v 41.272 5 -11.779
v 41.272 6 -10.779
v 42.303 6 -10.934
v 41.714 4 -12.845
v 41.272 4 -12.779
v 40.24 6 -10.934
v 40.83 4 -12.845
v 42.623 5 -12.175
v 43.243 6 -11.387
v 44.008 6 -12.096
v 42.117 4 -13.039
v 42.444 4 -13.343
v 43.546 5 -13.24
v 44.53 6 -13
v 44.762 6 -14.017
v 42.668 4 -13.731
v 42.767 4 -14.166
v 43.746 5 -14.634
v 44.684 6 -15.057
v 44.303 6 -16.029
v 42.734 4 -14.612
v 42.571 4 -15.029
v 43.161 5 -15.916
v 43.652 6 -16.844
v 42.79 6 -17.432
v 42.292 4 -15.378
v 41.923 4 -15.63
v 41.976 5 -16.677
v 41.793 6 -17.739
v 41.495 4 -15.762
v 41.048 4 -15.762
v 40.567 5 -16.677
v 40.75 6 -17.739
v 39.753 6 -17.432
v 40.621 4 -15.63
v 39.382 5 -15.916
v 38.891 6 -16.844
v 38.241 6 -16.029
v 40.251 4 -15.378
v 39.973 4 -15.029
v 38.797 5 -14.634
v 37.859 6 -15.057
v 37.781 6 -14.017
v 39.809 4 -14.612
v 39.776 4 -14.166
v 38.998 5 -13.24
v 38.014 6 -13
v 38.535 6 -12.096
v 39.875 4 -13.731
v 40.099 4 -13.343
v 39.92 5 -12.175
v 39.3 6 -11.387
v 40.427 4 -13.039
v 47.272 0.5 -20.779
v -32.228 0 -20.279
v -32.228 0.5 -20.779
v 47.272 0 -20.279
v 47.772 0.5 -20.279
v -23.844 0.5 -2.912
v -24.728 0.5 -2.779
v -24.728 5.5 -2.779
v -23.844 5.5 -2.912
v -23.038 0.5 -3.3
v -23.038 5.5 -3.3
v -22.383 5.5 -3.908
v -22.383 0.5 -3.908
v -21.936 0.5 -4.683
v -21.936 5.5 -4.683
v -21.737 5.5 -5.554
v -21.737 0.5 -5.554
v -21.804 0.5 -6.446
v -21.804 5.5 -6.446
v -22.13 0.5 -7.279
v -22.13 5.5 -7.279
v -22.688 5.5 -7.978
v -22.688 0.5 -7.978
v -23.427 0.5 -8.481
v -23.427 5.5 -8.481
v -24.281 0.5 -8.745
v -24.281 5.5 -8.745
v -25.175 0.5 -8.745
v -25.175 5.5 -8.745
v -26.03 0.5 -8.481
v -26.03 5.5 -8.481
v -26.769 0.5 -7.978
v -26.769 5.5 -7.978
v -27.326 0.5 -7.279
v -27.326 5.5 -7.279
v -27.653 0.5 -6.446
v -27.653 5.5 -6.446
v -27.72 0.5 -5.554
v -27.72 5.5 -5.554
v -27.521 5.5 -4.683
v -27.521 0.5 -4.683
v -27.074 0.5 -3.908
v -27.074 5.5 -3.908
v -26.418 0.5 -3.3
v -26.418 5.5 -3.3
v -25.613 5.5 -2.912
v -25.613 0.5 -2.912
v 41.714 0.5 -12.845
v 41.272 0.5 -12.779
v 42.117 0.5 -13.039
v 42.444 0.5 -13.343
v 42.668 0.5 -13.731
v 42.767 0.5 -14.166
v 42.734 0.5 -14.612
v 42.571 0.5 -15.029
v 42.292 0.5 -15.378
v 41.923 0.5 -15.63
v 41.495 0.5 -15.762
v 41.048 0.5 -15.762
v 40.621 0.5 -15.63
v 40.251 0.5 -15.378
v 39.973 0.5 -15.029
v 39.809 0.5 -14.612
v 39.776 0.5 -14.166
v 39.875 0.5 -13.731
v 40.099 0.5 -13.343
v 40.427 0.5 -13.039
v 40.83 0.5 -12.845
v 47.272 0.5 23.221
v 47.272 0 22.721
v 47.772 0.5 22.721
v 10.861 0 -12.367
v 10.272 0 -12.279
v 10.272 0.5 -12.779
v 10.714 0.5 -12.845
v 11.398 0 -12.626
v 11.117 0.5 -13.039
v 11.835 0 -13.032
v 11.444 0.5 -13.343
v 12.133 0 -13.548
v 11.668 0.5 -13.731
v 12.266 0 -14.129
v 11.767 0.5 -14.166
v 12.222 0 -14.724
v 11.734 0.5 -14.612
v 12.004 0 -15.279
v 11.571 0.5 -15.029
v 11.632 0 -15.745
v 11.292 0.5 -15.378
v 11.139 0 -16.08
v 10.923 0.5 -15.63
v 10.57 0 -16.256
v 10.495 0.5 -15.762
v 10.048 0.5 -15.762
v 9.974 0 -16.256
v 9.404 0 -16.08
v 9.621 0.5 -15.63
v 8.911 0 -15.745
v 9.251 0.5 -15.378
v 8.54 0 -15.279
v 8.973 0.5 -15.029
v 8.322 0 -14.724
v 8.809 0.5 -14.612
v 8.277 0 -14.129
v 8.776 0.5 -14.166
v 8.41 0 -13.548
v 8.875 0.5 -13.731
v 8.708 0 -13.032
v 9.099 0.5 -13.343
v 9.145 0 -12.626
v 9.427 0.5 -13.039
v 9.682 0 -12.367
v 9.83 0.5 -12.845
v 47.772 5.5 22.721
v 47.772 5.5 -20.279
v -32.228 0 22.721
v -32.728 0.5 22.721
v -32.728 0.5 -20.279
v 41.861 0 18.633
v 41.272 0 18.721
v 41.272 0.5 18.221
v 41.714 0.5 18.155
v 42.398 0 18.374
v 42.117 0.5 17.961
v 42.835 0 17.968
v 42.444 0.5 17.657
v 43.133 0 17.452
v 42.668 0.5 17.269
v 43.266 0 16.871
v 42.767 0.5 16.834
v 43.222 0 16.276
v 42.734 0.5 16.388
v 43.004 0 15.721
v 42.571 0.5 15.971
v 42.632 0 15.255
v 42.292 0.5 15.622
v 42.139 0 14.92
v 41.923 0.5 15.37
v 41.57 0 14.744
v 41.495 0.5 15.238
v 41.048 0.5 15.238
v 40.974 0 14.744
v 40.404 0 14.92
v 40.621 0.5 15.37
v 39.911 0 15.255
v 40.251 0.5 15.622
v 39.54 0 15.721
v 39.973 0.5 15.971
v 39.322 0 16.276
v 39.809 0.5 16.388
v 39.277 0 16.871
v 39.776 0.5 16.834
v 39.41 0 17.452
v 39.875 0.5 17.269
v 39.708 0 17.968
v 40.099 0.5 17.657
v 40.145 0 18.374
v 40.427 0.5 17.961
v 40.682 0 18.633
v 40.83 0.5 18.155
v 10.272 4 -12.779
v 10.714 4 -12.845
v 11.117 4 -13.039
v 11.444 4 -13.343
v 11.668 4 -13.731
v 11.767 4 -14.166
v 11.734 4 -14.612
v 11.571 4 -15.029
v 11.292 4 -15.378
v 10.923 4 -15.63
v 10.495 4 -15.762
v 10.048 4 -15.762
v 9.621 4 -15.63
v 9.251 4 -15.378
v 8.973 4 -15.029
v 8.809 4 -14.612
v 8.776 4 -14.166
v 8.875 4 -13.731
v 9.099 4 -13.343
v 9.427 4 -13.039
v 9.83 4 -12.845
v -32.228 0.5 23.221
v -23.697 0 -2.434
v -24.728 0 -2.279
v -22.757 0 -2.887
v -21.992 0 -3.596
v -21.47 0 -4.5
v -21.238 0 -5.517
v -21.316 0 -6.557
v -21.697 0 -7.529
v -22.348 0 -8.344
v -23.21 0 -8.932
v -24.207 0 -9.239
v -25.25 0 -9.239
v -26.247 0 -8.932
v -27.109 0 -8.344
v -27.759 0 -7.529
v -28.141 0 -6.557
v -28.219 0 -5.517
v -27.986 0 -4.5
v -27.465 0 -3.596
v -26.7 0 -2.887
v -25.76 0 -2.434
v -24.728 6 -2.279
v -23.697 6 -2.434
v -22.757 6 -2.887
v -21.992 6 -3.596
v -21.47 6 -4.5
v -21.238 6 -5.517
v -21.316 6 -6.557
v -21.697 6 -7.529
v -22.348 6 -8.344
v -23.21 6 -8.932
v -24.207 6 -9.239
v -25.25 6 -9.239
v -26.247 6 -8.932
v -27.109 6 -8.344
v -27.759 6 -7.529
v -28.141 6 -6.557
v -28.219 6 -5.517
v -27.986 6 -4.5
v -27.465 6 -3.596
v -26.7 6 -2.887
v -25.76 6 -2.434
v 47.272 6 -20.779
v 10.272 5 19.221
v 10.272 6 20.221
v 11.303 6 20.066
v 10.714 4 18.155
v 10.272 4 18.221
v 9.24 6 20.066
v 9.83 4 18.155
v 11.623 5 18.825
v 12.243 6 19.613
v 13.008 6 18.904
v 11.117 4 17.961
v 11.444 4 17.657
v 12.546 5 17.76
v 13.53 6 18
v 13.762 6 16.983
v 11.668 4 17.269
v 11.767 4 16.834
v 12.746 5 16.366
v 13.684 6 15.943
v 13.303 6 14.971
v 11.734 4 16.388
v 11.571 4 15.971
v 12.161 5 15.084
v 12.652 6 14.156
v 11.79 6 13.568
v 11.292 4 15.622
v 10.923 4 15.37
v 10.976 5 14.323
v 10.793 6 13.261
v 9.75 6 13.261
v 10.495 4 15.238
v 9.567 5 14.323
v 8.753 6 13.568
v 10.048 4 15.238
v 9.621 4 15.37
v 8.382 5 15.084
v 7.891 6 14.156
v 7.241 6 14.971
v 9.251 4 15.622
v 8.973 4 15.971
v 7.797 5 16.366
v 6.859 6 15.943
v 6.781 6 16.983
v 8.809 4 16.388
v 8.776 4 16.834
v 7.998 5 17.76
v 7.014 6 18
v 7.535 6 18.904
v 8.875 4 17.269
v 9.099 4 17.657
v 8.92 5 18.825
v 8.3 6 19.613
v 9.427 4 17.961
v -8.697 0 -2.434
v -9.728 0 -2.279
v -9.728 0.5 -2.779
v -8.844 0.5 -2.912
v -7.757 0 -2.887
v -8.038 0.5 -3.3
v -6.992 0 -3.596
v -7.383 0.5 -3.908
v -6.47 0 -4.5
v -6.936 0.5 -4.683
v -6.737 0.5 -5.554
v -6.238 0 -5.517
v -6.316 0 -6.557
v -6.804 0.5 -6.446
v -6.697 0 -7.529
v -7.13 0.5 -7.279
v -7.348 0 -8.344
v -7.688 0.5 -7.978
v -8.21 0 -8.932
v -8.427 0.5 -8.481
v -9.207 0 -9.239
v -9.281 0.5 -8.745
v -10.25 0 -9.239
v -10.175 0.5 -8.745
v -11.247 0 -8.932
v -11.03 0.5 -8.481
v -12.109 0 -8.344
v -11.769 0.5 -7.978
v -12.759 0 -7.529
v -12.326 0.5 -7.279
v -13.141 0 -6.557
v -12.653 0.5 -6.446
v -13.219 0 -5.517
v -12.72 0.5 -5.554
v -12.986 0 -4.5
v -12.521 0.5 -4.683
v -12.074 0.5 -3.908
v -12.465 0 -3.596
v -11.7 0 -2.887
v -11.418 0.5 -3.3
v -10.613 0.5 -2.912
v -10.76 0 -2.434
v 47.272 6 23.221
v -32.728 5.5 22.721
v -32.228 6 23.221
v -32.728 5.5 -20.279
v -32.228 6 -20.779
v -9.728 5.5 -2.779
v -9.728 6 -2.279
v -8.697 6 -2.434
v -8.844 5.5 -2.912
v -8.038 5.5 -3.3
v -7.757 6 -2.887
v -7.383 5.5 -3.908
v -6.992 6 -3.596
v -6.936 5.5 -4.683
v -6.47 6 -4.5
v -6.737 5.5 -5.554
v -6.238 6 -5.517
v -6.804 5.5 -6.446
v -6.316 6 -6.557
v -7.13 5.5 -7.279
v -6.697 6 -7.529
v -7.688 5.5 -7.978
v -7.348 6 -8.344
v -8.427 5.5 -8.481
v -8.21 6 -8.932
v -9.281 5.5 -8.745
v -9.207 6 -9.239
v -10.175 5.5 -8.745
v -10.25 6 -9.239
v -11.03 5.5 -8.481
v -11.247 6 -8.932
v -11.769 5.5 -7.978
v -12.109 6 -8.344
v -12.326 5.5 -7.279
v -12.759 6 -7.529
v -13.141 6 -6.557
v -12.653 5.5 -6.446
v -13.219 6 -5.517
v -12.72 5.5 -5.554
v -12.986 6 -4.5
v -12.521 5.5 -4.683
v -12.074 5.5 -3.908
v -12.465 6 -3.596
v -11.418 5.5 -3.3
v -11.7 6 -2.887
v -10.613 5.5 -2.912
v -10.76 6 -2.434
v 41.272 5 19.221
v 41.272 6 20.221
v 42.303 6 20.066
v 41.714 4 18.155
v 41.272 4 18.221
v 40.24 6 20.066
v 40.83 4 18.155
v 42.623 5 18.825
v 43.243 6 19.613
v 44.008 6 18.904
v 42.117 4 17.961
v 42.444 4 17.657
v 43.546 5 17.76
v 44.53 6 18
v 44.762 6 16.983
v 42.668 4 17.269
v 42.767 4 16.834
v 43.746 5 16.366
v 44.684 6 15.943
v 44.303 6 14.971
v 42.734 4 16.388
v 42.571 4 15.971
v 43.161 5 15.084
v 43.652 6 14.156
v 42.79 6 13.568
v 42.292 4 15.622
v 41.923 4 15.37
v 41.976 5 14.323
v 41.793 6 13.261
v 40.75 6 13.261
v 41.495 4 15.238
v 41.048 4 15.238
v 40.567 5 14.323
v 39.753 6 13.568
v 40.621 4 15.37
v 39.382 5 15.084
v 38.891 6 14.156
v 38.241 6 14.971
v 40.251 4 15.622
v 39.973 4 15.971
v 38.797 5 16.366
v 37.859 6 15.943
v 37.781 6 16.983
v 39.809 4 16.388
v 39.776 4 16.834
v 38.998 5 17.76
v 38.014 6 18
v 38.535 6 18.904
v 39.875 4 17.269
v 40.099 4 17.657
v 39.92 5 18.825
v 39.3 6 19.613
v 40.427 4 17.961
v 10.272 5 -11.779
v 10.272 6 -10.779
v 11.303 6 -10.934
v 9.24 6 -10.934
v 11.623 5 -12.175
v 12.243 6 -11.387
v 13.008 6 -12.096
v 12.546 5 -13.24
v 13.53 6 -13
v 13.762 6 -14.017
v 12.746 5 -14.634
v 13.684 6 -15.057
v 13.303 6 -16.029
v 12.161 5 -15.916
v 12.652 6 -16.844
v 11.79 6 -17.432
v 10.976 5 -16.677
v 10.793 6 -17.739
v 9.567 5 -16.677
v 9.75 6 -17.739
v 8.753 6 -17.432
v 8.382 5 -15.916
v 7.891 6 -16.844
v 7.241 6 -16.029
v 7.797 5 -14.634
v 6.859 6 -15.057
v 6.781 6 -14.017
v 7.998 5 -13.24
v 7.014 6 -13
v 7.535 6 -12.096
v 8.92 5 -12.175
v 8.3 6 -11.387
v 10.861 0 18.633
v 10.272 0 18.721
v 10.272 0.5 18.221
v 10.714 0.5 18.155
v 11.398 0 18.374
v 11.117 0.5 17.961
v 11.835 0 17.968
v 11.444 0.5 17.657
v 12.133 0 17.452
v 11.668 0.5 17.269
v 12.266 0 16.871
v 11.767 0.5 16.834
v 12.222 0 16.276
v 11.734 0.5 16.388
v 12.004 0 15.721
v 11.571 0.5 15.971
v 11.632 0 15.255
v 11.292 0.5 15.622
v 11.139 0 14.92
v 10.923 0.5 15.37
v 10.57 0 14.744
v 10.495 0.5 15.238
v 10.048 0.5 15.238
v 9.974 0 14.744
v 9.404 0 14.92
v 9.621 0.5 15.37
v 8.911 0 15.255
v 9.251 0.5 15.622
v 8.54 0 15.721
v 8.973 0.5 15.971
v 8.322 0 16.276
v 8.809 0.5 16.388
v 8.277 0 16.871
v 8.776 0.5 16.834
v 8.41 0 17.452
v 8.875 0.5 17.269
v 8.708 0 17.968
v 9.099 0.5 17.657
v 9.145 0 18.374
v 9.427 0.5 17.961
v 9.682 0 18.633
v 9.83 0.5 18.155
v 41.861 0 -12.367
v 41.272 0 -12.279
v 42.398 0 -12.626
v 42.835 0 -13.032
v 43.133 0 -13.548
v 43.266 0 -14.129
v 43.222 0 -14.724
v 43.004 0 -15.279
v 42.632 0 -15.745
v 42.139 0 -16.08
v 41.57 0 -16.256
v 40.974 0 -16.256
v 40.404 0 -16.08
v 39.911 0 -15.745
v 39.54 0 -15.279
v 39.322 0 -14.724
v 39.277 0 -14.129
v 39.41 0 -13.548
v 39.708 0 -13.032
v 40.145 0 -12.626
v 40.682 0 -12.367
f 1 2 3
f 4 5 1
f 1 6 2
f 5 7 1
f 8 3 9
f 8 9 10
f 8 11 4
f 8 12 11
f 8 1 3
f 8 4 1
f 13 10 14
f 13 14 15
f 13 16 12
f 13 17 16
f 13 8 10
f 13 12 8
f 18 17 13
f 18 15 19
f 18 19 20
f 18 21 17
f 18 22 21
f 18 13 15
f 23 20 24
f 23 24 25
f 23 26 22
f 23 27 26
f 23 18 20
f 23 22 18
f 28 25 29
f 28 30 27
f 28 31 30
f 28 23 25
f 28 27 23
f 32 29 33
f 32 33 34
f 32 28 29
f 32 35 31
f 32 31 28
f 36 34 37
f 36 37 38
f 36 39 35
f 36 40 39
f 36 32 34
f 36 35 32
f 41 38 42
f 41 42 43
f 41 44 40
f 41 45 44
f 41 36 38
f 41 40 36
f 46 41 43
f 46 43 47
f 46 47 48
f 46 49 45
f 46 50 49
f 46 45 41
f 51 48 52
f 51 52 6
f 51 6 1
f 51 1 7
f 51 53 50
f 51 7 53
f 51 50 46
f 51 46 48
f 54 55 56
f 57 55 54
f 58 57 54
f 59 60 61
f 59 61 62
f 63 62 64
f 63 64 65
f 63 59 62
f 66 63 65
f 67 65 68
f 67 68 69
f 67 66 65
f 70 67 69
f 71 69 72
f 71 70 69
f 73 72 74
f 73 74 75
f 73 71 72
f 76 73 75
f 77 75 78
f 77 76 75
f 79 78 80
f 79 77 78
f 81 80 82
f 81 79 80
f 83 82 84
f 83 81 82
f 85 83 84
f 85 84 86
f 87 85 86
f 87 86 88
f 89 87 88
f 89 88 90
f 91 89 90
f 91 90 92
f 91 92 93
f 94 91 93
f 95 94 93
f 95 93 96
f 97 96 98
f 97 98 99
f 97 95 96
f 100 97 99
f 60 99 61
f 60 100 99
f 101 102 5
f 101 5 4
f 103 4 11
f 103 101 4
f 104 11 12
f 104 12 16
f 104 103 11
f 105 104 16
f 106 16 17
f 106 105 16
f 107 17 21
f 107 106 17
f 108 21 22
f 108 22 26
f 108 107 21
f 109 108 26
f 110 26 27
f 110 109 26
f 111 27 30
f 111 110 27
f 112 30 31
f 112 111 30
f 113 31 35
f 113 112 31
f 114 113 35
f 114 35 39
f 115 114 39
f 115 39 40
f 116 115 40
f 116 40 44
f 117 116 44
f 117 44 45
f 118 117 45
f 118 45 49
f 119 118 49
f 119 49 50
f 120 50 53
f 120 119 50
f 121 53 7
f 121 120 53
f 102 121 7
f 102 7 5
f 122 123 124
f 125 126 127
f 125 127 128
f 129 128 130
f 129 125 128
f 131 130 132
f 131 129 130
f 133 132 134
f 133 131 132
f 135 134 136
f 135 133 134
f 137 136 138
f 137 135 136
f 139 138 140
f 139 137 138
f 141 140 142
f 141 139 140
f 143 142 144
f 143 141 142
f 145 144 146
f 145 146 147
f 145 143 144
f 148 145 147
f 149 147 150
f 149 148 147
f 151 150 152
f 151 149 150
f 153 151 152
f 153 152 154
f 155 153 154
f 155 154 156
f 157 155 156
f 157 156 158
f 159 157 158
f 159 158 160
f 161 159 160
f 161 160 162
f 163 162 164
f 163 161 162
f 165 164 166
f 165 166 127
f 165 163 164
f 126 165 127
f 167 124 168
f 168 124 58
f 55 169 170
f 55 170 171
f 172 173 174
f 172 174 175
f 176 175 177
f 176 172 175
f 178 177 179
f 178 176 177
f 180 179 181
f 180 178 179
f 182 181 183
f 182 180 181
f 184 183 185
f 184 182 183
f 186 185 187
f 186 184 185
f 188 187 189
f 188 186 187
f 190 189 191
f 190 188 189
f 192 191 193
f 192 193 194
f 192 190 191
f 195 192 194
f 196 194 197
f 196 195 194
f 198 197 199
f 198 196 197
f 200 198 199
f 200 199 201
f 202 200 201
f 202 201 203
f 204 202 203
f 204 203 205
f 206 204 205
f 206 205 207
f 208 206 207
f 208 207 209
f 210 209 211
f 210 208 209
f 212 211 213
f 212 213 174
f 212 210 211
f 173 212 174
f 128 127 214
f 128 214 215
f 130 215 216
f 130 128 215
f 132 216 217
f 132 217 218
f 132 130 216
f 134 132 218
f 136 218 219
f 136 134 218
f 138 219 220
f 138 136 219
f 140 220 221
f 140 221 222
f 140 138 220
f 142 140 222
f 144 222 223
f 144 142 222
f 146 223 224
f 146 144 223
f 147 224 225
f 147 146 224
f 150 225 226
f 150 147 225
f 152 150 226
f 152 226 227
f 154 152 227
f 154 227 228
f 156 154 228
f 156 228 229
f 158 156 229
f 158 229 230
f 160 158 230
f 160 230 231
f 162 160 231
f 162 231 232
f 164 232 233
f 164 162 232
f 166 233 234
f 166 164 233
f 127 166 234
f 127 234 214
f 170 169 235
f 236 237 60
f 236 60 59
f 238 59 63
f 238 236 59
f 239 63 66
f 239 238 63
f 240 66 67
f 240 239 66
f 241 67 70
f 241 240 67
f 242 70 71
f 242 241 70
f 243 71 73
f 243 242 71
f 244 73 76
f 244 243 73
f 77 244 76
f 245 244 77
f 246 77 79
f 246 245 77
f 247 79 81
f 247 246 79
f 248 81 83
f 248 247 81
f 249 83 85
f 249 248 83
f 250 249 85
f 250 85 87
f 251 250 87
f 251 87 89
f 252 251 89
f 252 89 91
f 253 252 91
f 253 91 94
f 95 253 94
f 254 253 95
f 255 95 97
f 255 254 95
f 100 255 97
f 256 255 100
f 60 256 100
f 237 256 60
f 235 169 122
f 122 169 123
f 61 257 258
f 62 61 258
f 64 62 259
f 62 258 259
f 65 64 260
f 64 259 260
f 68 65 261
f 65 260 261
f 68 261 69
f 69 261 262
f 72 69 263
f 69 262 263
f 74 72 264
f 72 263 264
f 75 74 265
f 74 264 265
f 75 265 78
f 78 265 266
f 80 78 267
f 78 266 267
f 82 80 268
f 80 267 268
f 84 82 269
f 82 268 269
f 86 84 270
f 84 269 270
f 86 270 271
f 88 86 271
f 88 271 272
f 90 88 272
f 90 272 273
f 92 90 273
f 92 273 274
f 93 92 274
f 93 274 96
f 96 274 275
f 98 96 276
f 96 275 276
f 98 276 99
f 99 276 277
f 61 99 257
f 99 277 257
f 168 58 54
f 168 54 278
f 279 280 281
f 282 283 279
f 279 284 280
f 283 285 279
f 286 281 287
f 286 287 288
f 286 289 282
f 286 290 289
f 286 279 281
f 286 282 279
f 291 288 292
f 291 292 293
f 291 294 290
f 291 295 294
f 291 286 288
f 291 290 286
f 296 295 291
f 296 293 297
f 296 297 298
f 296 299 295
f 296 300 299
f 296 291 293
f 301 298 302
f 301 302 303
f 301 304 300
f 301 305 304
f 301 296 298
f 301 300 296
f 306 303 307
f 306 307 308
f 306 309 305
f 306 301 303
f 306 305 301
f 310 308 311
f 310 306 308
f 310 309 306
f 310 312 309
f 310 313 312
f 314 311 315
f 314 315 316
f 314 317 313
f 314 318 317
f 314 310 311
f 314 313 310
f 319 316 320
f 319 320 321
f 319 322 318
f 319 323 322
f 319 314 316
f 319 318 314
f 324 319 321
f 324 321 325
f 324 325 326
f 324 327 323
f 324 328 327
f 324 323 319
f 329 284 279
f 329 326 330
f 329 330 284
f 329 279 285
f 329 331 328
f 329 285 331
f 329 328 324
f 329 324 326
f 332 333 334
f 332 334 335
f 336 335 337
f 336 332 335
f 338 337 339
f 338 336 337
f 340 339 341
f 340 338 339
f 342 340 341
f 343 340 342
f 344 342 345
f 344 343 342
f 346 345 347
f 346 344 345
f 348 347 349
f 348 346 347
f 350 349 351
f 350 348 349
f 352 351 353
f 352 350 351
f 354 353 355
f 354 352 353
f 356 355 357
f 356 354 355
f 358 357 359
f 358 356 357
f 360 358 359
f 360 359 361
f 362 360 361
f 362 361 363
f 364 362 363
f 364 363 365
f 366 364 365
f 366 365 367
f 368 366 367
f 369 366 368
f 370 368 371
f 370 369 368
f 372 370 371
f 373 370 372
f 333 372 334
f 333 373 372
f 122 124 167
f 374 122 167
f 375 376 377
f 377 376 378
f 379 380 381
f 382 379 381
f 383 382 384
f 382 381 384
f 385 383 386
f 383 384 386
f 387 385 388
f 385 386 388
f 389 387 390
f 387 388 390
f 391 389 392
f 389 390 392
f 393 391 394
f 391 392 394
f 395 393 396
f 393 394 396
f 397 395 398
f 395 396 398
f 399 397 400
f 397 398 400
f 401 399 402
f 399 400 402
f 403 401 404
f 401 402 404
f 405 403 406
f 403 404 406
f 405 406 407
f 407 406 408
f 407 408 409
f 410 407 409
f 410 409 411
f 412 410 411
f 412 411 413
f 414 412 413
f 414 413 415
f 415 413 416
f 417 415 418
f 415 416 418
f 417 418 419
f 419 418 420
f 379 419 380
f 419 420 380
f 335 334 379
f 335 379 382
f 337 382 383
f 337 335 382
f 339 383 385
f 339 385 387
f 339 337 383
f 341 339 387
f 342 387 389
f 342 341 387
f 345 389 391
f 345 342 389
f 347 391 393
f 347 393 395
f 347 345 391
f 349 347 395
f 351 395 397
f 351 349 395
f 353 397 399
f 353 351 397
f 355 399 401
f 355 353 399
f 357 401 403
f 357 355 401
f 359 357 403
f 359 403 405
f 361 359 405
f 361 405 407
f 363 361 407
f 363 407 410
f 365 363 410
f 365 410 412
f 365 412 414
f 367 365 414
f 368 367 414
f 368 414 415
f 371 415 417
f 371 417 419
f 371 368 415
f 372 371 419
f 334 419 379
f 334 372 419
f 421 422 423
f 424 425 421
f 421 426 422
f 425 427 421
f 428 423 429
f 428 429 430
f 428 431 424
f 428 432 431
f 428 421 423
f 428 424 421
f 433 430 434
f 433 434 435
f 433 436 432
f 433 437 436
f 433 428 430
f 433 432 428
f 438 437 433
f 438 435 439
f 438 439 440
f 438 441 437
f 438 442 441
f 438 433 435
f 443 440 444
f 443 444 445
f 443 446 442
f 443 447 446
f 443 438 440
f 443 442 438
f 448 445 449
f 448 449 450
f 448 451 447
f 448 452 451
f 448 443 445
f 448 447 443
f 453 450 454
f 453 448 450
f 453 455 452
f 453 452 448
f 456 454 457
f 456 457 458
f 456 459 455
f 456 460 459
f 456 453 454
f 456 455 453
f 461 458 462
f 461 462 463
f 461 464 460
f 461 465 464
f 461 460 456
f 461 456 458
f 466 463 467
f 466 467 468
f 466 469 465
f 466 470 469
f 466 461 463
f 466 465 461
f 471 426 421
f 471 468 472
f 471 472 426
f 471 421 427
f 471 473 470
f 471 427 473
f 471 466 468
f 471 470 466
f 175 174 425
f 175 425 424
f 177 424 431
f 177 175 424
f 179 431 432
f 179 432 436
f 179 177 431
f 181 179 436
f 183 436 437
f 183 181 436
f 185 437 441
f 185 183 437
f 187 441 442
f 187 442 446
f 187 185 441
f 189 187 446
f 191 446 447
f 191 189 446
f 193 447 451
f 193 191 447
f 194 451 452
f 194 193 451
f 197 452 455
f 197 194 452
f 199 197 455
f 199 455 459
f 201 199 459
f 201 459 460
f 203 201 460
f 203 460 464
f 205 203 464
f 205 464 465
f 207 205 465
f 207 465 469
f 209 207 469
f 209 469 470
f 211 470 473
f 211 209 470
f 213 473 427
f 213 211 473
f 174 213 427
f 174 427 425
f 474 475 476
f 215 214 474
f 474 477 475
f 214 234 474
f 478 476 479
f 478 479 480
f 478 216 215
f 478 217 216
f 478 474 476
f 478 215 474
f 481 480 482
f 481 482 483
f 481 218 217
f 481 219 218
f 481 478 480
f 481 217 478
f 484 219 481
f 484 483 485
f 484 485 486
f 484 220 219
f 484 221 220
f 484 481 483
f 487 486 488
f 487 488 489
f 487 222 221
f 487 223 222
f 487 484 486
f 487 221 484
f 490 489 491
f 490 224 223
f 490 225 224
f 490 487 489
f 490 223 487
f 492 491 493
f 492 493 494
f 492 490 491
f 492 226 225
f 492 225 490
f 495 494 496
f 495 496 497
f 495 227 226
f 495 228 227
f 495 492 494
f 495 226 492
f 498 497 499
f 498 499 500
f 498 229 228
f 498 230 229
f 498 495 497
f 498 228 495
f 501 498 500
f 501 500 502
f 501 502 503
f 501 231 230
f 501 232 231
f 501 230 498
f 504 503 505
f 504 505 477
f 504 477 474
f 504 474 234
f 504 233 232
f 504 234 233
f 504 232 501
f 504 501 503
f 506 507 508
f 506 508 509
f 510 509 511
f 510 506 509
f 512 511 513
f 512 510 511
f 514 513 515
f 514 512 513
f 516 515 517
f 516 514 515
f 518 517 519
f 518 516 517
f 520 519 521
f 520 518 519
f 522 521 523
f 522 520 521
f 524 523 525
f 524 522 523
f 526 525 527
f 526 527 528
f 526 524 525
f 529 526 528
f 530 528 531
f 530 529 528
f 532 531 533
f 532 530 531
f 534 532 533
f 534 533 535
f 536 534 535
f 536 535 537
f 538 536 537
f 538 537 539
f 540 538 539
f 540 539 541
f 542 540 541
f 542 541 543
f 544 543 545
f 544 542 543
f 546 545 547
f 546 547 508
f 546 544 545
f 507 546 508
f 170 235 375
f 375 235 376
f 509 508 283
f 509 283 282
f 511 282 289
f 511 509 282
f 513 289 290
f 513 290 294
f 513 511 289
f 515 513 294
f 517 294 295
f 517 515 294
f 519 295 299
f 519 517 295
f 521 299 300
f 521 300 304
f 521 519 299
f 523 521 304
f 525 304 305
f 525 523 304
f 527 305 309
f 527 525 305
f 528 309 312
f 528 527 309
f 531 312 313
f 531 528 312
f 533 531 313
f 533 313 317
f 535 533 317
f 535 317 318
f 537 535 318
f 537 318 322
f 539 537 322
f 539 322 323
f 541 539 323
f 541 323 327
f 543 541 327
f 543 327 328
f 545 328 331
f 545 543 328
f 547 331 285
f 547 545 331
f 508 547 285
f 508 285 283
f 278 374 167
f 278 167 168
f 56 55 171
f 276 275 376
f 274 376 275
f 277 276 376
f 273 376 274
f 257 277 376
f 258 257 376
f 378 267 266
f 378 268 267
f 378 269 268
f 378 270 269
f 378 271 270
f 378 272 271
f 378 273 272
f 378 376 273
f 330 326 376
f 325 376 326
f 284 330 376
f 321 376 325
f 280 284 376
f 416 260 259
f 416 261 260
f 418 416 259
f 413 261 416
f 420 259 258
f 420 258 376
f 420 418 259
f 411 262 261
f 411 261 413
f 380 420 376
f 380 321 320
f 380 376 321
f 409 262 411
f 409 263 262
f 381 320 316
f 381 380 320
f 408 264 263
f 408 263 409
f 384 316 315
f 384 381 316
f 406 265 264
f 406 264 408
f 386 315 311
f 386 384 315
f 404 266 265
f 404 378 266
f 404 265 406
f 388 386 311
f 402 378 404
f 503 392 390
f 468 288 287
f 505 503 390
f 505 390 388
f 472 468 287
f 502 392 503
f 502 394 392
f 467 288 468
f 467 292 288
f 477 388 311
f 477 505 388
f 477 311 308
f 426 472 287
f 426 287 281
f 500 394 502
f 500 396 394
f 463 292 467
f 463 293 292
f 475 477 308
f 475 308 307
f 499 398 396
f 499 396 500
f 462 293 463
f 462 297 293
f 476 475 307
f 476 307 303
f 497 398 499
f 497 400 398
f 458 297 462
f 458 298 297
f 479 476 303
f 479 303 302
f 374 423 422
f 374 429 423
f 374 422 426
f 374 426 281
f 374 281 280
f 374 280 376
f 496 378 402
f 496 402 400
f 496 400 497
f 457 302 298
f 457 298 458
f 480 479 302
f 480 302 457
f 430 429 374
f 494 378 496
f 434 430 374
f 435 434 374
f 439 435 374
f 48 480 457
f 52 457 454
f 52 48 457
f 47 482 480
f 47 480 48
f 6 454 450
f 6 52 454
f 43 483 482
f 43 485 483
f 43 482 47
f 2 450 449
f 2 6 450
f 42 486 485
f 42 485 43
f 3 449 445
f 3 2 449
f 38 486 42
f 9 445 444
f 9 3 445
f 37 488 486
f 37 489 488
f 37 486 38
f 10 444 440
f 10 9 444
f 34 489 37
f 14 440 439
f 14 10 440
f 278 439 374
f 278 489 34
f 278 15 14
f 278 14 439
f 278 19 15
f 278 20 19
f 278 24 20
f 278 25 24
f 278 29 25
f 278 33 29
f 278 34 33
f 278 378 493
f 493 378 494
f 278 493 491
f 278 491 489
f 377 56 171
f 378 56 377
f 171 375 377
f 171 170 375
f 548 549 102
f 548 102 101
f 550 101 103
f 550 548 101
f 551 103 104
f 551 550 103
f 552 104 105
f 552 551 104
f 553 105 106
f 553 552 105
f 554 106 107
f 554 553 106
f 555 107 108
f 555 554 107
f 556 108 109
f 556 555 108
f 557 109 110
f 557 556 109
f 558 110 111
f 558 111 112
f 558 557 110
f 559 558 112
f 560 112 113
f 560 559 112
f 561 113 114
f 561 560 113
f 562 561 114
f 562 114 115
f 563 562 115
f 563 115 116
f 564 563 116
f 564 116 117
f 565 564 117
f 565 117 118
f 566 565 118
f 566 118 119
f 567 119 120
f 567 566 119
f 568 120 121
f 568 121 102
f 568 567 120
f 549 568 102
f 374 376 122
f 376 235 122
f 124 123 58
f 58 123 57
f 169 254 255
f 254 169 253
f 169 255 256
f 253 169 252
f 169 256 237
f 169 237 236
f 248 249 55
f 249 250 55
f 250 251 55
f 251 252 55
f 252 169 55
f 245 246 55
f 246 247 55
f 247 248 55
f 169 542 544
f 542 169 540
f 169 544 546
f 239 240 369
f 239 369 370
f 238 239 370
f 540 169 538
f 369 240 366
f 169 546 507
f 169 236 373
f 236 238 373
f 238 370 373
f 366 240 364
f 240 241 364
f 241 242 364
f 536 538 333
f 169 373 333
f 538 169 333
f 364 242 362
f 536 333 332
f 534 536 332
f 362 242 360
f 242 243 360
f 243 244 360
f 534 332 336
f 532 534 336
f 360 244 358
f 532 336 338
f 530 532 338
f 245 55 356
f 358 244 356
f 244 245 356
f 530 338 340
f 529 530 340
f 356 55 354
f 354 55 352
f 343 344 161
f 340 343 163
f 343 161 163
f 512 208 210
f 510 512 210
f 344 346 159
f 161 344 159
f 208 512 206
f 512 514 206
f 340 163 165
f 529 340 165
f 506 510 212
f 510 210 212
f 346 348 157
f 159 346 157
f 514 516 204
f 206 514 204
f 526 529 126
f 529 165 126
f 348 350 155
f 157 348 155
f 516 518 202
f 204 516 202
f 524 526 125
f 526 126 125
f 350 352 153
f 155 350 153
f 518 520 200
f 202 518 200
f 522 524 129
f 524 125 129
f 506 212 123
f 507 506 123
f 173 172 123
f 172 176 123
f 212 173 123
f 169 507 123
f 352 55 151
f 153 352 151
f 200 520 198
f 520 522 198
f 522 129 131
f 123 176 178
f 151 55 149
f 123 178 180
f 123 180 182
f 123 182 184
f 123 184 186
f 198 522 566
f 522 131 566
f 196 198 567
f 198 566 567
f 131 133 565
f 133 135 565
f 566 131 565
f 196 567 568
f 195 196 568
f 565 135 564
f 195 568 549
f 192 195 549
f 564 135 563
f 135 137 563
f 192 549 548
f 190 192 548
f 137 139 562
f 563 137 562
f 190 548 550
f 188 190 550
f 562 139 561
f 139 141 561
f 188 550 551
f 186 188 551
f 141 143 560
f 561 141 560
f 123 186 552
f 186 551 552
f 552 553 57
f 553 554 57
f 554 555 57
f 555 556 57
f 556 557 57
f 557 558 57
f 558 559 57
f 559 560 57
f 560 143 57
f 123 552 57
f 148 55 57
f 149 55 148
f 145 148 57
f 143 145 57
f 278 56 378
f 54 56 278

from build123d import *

# Parameters (mm, degrees)
CROQUIS1_W              = 80.5
CROQUIS1_H              = 44
CROQUIS1_R              = 1.5
CROQUIS1_R_2            = 3
SALIENTE_EXTRUIR1_DEPTH = 6
CHAFL_N1_SIZE           = 0.5
CHAFL_N2_SIZE           = 2


with BuildPart() as part:
    # Croquis1 → Saliente-Extruir1 (new body)
    with BuildSketch(Plane(origin=(0, 0, 0), x_dir=(1, 0, 0), z_dir=(0, 1, 0))):
        with Locations((7.521686308, -1.221461187)):
            Rectangle(CROQUIS1_W, CROQUIS1_H)
        with Locations(Location((10.271686308, 14.278538813, 0), (0, 0, 270))):
            Circle(CROQUIS1_R, mode=Mode.SUBTRACT)
        with Locations(Location((41.271686308, 14.278538813, 0), (0, 0, 270))):
            Circle(CROQUIS1_R, mode=Mode.SUBTRACT)
        with Locations(Location((10.271686308, -16.721461187, 0), (0, 0, 270))):
            Circle(CROQUIS1_R, mode=Mode.SUBTRACT)
        with Locations(Location((41.271686308, -16.721461187, 0), (0, 0, 270))):
            Circle(CROQUIS1_R, mode=Mode.SUBTRACT)
        with Locations(Location((-24.728313692, 5.778538813, 0), (0, 0, 270))):
            Circle(CROQUIS1_R_2, mode=Mode.SUBTRACT)
        with Locations(Location((-9.728313692, 5.778538813, 0), (0, 0, 270))):
            Circle(CROQUIS1_R_2, mode=Mode.SUBTRACT)
    extrude(amount=SALIENTE_EXTRUIR1_DEPTH)

    # Chaflán1
    chafl_n1_edges = [part.edges().sort_by_distance(p)[0] for p in [
        (47.771686308, 6, 1.221461187),
        (10.271686308, 0, -15.778538813),
        (41.271686308, 0, -15.778538813),
        (10.271686308, 0, 15.221461187),
        (41.271686308, 0, 15.221461187),
        (-24.728313692, 0, -8.778538813),
        (-24.728313692, 6, -8.778538813),
        (-9.728313692, 0, -8.778538813),
        (-9.728313692, 6, -8.778538813),
        (-32.728313692, 6, 1.221461187),
        (7.521686308, 0, -20.778538813),
        (47.771686308, 0, 1.221461187),
        (7.521686308, 0, 23.221461187),
        (-32.728313692, 0, 1.221461187),
        (-32.728313692, 3, -20.778538813),
        (47.771686308, 3, -20.778538813),
        (47.771686308, 3, 23.221461187),
        (-32.728313692, 3, 23.221461187),
    ]]
    chamfer(chafl_n1_edges, length=CHAFL_N1_SIZE)

    # Chaflán2
    chafl_n2_edges = [part.edges().sort_by_distance(p)[0] for p in [
        (10.271686308, 6, -15.778538813),
        (41.271686308, 6, -15.778538813),
        (10.271686308, 6, 15.221461187),
        (41.271686308, 6, 15.221461187),
    ]]
    chamfer(chafl_n2_edges, length=CHAFL_N2_SIZE)


solid = part.part
